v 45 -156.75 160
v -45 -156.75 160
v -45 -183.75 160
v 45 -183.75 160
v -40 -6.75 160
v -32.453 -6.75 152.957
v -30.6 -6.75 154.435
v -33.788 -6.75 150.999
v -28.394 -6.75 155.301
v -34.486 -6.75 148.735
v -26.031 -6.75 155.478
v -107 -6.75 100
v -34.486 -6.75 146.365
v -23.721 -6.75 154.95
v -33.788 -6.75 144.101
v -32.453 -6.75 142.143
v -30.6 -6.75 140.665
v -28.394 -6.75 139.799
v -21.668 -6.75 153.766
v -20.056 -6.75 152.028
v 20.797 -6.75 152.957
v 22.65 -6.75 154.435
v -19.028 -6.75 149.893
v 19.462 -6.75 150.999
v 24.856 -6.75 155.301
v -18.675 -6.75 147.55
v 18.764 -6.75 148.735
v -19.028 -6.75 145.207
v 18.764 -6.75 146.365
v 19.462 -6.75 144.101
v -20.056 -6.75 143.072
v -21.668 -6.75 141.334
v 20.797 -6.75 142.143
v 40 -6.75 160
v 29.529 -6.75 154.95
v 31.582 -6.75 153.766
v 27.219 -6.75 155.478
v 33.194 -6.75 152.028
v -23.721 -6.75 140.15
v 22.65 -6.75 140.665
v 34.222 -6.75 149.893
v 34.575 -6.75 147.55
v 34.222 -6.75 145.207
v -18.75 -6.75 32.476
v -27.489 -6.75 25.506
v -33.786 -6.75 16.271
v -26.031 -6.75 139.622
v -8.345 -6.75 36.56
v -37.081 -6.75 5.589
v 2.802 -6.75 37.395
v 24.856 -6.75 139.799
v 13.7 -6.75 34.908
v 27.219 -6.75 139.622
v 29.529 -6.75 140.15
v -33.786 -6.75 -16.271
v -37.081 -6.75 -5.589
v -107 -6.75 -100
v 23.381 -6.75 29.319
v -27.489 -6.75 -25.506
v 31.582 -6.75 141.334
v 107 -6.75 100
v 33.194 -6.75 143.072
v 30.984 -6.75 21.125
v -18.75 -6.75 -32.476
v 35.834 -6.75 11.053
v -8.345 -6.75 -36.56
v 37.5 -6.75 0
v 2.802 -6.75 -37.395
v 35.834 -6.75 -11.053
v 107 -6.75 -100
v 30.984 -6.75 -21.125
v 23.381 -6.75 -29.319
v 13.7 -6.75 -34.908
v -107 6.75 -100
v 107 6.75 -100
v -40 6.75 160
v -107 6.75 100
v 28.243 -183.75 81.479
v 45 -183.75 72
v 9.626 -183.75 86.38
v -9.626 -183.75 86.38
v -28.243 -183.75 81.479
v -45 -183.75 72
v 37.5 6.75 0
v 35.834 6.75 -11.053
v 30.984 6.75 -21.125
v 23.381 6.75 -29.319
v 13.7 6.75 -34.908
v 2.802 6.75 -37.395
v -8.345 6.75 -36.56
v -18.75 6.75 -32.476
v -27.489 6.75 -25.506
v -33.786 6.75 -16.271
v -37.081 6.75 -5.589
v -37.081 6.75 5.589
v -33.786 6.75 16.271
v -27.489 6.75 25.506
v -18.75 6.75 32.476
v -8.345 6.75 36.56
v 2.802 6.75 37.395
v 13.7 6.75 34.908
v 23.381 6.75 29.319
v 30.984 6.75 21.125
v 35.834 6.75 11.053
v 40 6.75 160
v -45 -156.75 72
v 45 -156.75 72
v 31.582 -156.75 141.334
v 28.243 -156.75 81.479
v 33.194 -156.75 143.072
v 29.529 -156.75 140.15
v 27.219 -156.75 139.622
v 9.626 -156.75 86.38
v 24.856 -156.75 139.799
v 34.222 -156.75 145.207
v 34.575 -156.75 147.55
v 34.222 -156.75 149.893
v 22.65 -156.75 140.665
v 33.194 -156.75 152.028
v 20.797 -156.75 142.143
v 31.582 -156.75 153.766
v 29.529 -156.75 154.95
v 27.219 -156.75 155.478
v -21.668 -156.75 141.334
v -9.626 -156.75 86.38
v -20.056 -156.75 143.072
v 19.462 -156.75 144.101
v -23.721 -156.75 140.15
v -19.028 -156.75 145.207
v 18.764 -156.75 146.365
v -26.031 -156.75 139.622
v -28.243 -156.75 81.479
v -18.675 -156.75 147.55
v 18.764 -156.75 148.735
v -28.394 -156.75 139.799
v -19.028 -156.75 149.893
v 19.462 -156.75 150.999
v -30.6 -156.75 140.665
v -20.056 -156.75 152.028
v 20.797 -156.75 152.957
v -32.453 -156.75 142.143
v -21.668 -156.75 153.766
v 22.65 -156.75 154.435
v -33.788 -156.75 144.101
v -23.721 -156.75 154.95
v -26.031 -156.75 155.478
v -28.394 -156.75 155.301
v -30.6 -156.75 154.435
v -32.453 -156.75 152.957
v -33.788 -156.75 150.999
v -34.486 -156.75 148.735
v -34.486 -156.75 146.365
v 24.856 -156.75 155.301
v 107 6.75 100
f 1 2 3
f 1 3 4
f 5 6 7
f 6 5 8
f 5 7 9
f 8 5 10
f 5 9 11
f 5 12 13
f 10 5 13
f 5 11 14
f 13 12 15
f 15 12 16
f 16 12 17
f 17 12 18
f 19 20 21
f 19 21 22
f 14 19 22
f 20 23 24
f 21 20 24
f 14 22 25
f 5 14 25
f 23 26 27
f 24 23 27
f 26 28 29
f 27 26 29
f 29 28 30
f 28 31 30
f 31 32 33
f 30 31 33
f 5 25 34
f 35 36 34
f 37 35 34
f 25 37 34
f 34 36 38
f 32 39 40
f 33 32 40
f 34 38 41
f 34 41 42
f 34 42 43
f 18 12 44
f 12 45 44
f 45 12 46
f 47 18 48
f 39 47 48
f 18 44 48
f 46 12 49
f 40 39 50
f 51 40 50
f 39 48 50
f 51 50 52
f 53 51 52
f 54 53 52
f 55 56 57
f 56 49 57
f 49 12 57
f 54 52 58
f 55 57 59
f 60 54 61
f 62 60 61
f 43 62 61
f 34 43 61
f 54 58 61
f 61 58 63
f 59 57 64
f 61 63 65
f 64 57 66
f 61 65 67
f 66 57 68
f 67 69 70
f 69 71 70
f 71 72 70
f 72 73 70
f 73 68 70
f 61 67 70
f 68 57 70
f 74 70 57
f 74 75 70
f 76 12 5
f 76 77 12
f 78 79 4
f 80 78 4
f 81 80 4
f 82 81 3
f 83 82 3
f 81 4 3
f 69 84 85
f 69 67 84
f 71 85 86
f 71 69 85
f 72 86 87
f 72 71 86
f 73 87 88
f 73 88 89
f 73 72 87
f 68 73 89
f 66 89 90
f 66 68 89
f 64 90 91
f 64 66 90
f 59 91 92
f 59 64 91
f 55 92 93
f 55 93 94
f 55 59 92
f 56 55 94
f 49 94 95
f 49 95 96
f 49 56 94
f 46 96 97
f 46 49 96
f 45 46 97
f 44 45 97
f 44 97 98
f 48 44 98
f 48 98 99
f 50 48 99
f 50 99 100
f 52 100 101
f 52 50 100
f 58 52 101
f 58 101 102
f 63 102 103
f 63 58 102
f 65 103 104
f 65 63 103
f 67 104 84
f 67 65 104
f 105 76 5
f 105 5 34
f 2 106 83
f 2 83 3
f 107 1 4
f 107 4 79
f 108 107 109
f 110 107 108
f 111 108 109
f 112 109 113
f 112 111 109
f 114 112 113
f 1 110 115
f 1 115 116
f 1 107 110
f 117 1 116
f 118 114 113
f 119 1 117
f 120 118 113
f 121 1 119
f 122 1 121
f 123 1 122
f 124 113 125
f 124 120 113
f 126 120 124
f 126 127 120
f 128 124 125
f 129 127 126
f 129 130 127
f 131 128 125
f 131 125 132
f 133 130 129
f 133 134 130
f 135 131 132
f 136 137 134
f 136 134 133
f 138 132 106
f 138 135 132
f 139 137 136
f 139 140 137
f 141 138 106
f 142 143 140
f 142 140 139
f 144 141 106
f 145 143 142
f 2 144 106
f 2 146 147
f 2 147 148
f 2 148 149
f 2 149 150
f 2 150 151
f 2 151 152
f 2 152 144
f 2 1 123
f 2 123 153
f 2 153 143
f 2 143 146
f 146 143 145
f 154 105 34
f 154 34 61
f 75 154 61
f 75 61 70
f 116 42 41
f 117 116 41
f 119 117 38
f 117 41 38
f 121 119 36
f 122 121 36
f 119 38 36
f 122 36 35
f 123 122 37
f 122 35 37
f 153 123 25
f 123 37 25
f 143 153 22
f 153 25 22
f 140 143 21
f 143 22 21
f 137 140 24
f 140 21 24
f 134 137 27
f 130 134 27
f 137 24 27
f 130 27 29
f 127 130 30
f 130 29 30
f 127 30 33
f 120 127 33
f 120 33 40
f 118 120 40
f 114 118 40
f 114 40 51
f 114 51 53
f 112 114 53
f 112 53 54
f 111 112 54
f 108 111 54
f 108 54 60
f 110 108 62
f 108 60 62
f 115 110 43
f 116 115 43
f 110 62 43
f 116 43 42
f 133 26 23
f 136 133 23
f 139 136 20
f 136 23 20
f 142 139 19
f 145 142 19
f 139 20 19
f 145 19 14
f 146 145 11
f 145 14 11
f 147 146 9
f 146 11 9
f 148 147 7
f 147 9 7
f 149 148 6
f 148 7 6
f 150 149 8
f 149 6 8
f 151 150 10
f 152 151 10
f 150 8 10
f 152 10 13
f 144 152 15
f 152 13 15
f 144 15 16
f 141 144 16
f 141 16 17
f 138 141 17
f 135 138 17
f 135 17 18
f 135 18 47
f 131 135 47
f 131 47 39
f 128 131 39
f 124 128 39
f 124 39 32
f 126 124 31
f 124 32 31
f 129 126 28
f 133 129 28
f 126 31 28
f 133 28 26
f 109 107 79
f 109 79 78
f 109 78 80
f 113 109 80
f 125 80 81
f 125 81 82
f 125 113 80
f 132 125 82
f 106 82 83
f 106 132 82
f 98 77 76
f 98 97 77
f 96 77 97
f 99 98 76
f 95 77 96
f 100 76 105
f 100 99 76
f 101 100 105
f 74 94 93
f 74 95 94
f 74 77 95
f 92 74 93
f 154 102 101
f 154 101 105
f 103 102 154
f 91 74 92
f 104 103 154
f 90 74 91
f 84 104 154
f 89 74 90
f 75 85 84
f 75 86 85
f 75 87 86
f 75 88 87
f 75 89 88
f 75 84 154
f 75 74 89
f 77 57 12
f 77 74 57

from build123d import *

# Parameters (mm, degrees)
SKETCH2_R           = 37.5
BOSS_EXTRUDE1_DEPTH = 6.75
SKETCH3_R           = 7.95
BOSS_EXTRUDE2_DEPTH = 150
BOSS_EXTRUDE3_DEPTH = 27


with BuildPart() as part:
    # Sketch2 → Boss-Extrude1 (new body, symmetric)
    with BuildSketch(Plane(origin=(0, 0, 0), x_dir=(1, 0, 0), z_dir=(0, 1, 0))):
        Polygon((-107, -100), (-40, -160), (40, -160), (107, -100), (107, 100), (-107, 100), align=None)
        Circle(SKETCH2_R, mode=Mode.SUBTRACT)
    extrude(amount=BOSS_EXTRUDE1_DEPTH, both=True)

    # Sketch3 → Boss-Extrude2 (add)
    with BuildSketch(Plane.XZ.offset(6.75)):
        with Locations((26.625, 147.55)):
            Circle(SKETCH3_R)
        with Locations((-26.625, 147.55)):
            Circle(SKETCH3_R)
    extrude(amount=BOSS_EXTRUDE2_DEPTH)

    # Sketch4 → Boss-Extrude3 (add)
    with BuildSketch(Plane.XZ.offset(156.75)):
        with BuildLine():
            Line((-45, 72), (-45, 160))
            Line((-45, 160), (45, 160))
            Line((45, 160), (45, 72))
            ThreePointArc((45, 72), (0, 87), (-45, 72))
        make_face()
    extrude(amount=BOSS_EXTRUDE3_DEPTH)


solid = part.part
